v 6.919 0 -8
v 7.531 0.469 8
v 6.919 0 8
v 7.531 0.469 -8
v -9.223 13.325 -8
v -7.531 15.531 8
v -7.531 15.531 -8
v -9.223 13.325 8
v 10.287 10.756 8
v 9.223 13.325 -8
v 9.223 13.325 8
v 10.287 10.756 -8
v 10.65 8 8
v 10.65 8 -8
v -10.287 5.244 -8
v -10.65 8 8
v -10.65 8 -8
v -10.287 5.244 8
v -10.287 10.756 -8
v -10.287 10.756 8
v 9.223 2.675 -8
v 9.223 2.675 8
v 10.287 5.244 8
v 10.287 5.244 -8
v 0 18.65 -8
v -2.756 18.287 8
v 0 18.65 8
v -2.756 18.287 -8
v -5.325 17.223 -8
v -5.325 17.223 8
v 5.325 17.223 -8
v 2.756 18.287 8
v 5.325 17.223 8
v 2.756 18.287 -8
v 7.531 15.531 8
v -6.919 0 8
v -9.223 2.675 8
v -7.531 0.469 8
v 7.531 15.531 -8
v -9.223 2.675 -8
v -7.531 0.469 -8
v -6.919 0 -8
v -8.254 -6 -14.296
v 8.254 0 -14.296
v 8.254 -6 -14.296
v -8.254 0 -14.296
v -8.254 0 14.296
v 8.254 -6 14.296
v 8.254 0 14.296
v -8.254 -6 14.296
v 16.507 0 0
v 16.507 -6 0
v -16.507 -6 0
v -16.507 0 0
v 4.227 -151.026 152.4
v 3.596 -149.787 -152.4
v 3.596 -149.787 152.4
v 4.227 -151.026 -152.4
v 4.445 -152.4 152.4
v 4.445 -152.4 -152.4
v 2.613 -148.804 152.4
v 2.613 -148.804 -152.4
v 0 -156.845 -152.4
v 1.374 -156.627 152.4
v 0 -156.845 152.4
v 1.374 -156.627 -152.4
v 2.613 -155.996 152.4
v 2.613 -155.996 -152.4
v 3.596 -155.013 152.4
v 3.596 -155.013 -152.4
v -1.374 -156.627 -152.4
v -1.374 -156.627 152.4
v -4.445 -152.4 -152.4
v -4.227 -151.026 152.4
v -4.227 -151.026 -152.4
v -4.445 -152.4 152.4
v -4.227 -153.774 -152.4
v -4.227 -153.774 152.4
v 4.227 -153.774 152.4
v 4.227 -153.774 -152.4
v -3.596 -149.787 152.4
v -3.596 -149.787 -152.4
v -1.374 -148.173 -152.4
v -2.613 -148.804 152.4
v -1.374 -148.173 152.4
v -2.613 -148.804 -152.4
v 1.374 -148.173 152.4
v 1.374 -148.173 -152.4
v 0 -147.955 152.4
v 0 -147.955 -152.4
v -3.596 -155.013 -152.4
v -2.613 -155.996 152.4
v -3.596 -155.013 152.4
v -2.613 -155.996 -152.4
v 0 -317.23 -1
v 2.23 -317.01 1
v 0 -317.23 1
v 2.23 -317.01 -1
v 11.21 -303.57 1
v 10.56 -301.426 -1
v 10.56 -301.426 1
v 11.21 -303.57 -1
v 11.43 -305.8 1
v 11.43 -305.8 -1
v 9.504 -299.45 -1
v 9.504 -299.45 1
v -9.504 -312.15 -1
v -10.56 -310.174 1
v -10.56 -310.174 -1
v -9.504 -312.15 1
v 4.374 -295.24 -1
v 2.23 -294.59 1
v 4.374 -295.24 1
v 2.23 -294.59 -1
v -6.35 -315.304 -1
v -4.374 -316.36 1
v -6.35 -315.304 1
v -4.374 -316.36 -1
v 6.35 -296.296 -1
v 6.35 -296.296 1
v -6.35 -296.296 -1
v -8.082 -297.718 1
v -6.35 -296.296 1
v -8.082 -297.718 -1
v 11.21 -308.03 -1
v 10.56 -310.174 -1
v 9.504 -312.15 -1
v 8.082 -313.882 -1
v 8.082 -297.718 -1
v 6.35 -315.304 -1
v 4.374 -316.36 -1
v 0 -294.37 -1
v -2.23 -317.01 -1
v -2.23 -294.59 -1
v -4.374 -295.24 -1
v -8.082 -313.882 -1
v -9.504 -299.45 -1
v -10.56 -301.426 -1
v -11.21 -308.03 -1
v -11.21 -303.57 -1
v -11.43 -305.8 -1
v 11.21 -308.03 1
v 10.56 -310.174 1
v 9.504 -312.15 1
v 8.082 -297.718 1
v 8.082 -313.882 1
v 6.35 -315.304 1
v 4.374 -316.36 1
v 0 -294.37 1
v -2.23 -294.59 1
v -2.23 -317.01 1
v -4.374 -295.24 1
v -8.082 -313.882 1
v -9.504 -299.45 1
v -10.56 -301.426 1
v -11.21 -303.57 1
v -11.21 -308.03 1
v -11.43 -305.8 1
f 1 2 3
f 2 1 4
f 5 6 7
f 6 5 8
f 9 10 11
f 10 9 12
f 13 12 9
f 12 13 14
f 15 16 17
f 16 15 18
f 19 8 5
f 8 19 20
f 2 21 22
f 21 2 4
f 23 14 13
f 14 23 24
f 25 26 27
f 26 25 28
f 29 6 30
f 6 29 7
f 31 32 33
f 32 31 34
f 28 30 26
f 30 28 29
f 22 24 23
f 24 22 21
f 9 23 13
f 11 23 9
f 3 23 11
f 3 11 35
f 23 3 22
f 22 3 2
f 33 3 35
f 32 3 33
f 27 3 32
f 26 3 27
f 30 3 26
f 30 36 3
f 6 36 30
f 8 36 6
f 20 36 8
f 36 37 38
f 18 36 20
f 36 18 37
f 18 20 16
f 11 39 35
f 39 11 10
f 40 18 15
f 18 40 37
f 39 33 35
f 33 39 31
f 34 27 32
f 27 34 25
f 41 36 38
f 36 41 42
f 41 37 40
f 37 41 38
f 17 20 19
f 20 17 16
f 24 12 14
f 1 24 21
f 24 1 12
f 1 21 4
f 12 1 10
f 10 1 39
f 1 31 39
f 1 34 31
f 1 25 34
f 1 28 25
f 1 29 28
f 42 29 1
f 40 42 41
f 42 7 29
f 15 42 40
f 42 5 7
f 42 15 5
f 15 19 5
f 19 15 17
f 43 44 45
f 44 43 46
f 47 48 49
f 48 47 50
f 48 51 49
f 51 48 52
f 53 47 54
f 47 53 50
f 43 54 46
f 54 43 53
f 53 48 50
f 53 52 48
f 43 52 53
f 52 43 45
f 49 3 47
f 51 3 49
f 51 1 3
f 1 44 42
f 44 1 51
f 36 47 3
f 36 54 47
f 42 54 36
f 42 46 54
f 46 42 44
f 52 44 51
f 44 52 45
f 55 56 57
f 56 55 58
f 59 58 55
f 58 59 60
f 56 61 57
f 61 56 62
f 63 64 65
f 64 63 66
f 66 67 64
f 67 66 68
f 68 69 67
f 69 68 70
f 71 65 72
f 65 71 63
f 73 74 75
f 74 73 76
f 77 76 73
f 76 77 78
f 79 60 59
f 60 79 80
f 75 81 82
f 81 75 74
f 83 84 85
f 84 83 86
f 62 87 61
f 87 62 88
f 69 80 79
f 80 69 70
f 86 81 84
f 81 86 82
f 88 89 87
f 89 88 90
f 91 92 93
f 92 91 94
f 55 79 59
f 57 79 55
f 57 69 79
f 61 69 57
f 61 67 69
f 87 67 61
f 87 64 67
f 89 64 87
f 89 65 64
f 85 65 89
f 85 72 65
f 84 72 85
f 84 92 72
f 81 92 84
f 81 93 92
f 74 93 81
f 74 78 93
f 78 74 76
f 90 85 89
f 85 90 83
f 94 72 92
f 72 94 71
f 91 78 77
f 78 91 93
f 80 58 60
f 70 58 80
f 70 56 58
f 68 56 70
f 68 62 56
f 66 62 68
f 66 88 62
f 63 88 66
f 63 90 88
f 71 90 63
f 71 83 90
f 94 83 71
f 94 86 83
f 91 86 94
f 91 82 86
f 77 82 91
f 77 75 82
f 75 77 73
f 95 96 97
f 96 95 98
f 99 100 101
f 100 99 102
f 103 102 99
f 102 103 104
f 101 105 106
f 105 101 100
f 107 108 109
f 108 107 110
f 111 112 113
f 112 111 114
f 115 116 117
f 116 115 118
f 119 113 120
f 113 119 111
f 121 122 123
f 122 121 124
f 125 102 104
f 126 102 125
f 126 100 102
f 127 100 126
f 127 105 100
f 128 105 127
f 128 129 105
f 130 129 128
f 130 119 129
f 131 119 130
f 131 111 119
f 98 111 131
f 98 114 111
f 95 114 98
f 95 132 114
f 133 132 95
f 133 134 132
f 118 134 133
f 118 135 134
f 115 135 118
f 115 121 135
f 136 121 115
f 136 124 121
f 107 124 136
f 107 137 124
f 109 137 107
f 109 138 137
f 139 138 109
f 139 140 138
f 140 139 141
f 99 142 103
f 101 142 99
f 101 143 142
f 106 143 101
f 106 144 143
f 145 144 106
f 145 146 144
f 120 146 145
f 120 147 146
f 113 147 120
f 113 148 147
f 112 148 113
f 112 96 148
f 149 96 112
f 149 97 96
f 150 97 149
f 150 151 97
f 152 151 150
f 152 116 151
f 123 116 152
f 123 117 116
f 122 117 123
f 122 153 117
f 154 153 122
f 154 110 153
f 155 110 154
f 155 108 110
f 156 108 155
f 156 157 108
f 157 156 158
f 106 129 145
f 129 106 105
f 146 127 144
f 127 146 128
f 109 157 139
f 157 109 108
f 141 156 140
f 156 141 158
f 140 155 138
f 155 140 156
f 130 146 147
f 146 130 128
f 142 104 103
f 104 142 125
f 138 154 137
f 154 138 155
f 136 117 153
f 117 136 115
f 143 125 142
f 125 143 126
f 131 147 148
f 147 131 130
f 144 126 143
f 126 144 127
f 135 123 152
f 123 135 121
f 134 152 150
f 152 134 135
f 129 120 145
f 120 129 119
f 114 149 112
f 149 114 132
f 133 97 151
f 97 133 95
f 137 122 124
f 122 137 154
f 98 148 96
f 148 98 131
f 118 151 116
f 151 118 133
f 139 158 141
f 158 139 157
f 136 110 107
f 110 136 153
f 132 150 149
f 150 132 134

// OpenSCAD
// Auto-generated by scripts/author_from_manifest.py (Phase D.3).
// Source: data/phase_d_manifest.json (sku_intent='viking-vk597-dry-pendent-200f').
// Do not hand-edit — regenerate from the manifest.
//
// @part viking_vk597_dry_pendent_200f
// @kind sprinkler_head
// @category head.pendant.k56
// @display-name "Viking VK597 Dry Pendent K5.6 200°F"
// @mfg viking_group
// @mfg-pn VK597
// @listing UL FM
// @hazard-classes LH OH1
// @price-usd 79.00
// @install-minutes 14
// @crew journeyman
// @k-factor 5.6
// @orientation pendant
// @response standard
// @temperature 200F
// @param size_in number default=0.5 label="Size" unit="in"
// @port inlet position=[0,0.014,0] direction=[0,1,0] style=NPT_threaded size_in=0.5 role=drop

size_in = 0.5;
k_factor = 5.6;

length_mm   = 304.80;
body_dia_mm = 25.40;
thread_od   = 21.3;
thread_len  = 16;
deflector_d = body_dia_mm * 0.9;

 union() {
    translate([0, thread_len/2, 0])
        cylinder(h = thread_len, d = thread_od, center = true, $fn = 24);
    translate([0, -3, 0])
        rotate([90, 0, 0])
        cylinder(h = 6, d = thread_od * 1.55, $fn = 6, center = true);
    translate([0, -length_mm/2, 0])
        cylinder(h = length_mm, d = body_dia_mm * 0.35, center = true, $fn = 20);
    translate([0, -length_mm - 1, 0])
        cylinder(h = 2, d = deflector_d, center = true, $fn = 32);
}
